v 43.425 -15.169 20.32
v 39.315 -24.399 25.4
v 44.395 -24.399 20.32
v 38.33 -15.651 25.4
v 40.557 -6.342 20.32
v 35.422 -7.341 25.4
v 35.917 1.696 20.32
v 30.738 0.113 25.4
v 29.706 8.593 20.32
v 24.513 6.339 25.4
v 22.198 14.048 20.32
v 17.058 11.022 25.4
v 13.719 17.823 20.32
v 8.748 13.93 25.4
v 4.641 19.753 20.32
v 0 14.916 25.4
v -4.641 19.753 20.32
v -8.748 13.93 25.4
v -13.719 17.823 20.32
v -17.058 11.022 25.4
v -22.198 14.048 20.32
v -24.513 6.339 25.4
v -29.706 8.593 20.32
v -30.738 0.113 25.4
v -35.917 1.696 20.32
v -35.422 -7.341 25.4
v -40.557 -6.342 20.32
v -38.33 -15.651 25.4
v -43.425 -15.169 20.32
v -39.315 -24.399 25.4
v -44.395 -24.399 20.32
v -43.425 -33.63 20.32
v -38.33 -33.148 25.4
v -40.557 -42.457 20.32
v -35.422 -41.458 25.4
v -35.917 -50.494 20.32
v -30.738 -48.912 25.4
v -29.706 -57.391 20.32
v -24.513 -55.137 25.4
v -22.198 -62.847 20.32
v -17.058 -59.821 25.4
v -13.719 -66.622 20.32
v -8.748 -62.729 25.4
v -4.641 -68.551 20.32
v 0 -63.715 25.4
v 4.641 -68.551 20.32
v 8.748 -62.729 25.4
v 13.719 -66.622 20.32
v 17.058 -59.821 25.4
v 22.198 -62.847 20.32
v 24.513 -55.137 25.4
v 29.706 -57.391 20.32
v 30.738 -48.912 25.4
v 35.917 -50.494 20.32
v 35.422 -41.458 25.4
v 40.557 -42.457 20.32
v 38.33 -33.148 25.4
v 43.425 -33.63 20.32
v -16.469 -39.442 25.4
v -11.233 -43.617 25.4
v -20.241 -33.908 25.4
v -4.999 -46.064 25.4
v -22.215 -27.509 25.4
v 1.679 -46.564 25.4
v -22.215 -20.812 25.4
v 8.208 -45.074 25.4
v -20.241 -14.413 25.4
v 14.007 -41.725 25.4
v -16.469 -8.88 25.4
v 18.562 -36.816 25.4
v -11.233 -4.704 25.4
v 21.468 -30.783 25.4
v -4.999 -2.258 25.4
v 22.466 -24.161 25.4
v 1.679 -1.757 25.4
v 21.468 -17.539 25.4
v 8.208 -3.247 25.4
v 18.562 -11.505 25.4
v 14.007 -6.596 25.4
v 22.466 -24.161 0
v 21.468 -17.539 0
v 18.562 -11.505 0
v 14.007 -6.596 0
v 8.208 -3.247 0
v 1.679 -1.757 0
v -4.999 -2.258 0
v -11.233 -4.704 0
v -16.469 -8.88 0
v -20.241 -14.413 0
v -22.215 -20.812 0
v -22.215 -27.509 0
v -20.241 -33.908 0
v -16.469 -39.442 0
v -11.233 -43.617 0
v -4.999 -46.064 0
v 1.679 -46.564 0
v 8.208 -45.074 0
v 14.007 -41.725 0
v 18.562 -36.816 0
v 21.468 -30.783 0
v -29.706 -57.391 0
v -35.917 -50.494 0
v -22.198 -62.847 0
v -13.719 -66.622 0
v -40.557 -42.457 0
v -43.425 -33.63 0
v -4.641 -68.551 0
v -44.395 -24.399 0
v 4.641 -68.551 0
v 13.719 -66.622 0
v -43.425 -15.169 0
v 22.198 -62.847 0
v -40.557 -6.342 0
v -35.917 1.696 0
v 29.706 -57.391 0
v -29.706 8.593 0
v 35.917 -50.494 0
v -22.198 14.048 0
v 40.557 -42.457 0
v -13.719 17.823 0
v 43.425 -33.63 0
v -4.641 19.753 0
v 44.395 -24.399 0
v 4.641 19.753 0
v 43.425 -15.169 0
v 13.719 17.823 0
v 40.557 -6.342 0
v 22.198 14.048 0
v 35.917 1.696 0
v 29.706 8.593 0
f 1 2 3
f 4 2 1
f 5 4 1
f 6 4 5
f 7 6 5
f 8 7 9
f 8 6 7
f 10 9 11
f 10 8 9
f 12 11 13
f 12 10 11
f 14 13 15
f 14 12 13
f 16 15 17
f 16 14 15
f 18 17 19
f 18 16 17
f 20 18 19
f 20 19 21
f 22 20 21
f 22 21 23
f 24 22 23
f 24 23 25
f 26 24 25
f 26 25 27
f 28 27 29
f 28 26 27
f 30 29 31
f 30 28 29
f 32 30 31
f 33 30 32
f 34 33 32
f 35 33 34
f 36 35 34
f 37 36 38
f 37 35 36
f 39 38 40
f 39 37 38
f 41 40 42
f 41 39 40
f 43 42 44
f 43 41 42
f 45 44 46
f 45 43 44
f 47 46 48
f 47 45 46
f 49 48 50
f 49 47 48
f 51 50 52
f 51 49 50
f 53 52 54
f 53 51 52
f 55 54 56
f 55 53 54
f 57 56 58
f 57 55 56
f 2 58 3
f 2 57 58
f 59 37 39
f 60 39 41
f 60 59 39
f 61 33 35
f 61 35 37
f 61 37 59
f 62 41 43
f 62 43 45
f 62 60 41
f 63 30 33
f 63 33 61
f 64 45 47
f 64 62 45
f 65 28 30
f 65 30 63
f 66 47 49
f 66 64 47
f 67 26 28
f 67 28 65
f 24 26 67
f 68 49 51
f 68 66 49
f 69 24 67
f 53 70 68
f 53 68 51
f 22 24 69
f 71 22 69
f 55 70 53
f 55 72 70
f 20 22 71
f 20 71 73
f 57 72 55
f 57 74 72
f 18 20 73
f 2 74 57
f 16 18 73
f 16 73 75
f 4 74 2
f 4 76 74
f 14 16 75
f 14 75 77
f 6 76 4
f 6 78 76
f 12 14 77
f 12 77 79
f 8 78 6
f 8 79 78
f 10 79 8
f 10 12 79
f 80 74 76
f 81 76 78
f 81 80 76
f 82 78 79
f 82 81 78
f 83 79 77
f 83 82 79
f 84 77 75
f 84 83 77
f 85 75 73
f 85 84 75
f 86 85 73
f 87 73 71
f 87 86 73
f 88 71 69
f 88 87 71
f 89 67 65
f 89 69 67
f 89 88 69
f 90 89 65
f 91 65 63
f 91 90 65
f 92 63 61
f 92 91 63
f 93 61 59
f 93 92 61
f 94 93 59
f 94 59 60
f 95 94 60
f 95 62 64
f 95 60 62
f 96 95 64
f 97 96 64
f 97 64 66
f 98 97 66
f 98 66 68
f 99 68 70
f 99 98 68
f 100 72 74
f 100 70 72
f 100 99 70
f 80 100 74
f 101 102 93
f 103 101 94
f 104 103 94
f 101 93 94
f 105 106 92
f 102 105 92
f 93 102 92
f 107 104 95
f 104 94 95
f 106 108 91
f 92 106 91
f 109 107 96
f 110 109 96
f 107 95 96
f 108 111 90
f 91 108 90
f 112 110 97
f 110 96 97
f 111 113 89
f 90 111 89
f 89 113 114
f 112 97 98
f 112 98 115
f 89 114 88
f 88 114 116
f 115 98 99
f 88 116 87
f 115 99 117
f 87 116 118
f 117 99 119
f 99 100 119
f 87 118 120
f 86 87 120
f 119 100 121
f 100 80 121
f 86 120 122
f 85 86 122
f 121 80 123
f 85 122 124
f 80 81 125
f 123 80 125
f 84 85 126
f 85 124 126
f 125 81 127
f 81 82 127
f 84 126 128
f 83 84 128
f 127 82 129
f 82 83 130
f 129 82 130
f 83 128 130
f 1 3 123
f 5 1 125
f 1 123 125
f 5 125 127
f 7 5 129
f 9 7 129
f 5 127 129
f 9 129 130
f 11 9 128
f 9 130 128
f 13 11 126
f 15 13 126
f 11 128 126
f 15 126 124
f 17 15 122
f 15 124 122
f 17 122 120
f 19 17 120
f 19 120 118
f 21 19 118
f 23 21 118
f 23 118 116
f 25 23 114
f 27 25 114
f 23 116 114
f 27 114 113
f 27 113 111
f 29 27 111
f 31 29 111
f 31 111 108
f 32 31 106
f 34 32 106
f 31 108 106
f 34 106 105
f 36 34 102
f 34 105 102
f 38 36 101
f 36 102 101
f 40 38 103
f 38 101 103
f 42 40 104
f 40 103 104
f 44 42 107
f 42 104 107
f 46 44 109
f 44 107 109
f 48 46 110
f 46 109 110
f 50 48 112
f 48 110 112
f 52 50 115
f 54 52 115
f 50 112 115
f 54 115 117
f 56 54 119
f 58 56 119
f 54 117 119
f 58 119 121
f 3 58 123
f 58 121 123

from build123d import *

# Parameters (mm, degrees)
F0_R     = 44.395237
F1_DEPTH = 25.4
F2_SIZE  = 5.08
F3_R     = 22.466185
F4_DEPTH = 25.401


with BuildPart() as f1:
    # F0 (on Top) → F1 (new body)
    with BuildSketch(Plane.XY):
        with Locations((0, -24.399335)):
            Circle(F0_R)
    extrude(amount=F1_DEPTH)

    # F2
    f2_edges = [f1.edges().sort_by_distance(p)[0] for p in [
        (-44.395237, -24.399335, 25.4),
    ]]
    chamfer(f2_edges, length=F2_SIZE)

    # F3 (on Top) → F4 (cut, through all)
    with BuildSketch(Plane.XY):
        with Locations((0, -24.16065)):
            Circle(F3_R)
    extrude(amount=F4_DEPTH, mode=Mode.SUBTRACT)


solid = f1.part
